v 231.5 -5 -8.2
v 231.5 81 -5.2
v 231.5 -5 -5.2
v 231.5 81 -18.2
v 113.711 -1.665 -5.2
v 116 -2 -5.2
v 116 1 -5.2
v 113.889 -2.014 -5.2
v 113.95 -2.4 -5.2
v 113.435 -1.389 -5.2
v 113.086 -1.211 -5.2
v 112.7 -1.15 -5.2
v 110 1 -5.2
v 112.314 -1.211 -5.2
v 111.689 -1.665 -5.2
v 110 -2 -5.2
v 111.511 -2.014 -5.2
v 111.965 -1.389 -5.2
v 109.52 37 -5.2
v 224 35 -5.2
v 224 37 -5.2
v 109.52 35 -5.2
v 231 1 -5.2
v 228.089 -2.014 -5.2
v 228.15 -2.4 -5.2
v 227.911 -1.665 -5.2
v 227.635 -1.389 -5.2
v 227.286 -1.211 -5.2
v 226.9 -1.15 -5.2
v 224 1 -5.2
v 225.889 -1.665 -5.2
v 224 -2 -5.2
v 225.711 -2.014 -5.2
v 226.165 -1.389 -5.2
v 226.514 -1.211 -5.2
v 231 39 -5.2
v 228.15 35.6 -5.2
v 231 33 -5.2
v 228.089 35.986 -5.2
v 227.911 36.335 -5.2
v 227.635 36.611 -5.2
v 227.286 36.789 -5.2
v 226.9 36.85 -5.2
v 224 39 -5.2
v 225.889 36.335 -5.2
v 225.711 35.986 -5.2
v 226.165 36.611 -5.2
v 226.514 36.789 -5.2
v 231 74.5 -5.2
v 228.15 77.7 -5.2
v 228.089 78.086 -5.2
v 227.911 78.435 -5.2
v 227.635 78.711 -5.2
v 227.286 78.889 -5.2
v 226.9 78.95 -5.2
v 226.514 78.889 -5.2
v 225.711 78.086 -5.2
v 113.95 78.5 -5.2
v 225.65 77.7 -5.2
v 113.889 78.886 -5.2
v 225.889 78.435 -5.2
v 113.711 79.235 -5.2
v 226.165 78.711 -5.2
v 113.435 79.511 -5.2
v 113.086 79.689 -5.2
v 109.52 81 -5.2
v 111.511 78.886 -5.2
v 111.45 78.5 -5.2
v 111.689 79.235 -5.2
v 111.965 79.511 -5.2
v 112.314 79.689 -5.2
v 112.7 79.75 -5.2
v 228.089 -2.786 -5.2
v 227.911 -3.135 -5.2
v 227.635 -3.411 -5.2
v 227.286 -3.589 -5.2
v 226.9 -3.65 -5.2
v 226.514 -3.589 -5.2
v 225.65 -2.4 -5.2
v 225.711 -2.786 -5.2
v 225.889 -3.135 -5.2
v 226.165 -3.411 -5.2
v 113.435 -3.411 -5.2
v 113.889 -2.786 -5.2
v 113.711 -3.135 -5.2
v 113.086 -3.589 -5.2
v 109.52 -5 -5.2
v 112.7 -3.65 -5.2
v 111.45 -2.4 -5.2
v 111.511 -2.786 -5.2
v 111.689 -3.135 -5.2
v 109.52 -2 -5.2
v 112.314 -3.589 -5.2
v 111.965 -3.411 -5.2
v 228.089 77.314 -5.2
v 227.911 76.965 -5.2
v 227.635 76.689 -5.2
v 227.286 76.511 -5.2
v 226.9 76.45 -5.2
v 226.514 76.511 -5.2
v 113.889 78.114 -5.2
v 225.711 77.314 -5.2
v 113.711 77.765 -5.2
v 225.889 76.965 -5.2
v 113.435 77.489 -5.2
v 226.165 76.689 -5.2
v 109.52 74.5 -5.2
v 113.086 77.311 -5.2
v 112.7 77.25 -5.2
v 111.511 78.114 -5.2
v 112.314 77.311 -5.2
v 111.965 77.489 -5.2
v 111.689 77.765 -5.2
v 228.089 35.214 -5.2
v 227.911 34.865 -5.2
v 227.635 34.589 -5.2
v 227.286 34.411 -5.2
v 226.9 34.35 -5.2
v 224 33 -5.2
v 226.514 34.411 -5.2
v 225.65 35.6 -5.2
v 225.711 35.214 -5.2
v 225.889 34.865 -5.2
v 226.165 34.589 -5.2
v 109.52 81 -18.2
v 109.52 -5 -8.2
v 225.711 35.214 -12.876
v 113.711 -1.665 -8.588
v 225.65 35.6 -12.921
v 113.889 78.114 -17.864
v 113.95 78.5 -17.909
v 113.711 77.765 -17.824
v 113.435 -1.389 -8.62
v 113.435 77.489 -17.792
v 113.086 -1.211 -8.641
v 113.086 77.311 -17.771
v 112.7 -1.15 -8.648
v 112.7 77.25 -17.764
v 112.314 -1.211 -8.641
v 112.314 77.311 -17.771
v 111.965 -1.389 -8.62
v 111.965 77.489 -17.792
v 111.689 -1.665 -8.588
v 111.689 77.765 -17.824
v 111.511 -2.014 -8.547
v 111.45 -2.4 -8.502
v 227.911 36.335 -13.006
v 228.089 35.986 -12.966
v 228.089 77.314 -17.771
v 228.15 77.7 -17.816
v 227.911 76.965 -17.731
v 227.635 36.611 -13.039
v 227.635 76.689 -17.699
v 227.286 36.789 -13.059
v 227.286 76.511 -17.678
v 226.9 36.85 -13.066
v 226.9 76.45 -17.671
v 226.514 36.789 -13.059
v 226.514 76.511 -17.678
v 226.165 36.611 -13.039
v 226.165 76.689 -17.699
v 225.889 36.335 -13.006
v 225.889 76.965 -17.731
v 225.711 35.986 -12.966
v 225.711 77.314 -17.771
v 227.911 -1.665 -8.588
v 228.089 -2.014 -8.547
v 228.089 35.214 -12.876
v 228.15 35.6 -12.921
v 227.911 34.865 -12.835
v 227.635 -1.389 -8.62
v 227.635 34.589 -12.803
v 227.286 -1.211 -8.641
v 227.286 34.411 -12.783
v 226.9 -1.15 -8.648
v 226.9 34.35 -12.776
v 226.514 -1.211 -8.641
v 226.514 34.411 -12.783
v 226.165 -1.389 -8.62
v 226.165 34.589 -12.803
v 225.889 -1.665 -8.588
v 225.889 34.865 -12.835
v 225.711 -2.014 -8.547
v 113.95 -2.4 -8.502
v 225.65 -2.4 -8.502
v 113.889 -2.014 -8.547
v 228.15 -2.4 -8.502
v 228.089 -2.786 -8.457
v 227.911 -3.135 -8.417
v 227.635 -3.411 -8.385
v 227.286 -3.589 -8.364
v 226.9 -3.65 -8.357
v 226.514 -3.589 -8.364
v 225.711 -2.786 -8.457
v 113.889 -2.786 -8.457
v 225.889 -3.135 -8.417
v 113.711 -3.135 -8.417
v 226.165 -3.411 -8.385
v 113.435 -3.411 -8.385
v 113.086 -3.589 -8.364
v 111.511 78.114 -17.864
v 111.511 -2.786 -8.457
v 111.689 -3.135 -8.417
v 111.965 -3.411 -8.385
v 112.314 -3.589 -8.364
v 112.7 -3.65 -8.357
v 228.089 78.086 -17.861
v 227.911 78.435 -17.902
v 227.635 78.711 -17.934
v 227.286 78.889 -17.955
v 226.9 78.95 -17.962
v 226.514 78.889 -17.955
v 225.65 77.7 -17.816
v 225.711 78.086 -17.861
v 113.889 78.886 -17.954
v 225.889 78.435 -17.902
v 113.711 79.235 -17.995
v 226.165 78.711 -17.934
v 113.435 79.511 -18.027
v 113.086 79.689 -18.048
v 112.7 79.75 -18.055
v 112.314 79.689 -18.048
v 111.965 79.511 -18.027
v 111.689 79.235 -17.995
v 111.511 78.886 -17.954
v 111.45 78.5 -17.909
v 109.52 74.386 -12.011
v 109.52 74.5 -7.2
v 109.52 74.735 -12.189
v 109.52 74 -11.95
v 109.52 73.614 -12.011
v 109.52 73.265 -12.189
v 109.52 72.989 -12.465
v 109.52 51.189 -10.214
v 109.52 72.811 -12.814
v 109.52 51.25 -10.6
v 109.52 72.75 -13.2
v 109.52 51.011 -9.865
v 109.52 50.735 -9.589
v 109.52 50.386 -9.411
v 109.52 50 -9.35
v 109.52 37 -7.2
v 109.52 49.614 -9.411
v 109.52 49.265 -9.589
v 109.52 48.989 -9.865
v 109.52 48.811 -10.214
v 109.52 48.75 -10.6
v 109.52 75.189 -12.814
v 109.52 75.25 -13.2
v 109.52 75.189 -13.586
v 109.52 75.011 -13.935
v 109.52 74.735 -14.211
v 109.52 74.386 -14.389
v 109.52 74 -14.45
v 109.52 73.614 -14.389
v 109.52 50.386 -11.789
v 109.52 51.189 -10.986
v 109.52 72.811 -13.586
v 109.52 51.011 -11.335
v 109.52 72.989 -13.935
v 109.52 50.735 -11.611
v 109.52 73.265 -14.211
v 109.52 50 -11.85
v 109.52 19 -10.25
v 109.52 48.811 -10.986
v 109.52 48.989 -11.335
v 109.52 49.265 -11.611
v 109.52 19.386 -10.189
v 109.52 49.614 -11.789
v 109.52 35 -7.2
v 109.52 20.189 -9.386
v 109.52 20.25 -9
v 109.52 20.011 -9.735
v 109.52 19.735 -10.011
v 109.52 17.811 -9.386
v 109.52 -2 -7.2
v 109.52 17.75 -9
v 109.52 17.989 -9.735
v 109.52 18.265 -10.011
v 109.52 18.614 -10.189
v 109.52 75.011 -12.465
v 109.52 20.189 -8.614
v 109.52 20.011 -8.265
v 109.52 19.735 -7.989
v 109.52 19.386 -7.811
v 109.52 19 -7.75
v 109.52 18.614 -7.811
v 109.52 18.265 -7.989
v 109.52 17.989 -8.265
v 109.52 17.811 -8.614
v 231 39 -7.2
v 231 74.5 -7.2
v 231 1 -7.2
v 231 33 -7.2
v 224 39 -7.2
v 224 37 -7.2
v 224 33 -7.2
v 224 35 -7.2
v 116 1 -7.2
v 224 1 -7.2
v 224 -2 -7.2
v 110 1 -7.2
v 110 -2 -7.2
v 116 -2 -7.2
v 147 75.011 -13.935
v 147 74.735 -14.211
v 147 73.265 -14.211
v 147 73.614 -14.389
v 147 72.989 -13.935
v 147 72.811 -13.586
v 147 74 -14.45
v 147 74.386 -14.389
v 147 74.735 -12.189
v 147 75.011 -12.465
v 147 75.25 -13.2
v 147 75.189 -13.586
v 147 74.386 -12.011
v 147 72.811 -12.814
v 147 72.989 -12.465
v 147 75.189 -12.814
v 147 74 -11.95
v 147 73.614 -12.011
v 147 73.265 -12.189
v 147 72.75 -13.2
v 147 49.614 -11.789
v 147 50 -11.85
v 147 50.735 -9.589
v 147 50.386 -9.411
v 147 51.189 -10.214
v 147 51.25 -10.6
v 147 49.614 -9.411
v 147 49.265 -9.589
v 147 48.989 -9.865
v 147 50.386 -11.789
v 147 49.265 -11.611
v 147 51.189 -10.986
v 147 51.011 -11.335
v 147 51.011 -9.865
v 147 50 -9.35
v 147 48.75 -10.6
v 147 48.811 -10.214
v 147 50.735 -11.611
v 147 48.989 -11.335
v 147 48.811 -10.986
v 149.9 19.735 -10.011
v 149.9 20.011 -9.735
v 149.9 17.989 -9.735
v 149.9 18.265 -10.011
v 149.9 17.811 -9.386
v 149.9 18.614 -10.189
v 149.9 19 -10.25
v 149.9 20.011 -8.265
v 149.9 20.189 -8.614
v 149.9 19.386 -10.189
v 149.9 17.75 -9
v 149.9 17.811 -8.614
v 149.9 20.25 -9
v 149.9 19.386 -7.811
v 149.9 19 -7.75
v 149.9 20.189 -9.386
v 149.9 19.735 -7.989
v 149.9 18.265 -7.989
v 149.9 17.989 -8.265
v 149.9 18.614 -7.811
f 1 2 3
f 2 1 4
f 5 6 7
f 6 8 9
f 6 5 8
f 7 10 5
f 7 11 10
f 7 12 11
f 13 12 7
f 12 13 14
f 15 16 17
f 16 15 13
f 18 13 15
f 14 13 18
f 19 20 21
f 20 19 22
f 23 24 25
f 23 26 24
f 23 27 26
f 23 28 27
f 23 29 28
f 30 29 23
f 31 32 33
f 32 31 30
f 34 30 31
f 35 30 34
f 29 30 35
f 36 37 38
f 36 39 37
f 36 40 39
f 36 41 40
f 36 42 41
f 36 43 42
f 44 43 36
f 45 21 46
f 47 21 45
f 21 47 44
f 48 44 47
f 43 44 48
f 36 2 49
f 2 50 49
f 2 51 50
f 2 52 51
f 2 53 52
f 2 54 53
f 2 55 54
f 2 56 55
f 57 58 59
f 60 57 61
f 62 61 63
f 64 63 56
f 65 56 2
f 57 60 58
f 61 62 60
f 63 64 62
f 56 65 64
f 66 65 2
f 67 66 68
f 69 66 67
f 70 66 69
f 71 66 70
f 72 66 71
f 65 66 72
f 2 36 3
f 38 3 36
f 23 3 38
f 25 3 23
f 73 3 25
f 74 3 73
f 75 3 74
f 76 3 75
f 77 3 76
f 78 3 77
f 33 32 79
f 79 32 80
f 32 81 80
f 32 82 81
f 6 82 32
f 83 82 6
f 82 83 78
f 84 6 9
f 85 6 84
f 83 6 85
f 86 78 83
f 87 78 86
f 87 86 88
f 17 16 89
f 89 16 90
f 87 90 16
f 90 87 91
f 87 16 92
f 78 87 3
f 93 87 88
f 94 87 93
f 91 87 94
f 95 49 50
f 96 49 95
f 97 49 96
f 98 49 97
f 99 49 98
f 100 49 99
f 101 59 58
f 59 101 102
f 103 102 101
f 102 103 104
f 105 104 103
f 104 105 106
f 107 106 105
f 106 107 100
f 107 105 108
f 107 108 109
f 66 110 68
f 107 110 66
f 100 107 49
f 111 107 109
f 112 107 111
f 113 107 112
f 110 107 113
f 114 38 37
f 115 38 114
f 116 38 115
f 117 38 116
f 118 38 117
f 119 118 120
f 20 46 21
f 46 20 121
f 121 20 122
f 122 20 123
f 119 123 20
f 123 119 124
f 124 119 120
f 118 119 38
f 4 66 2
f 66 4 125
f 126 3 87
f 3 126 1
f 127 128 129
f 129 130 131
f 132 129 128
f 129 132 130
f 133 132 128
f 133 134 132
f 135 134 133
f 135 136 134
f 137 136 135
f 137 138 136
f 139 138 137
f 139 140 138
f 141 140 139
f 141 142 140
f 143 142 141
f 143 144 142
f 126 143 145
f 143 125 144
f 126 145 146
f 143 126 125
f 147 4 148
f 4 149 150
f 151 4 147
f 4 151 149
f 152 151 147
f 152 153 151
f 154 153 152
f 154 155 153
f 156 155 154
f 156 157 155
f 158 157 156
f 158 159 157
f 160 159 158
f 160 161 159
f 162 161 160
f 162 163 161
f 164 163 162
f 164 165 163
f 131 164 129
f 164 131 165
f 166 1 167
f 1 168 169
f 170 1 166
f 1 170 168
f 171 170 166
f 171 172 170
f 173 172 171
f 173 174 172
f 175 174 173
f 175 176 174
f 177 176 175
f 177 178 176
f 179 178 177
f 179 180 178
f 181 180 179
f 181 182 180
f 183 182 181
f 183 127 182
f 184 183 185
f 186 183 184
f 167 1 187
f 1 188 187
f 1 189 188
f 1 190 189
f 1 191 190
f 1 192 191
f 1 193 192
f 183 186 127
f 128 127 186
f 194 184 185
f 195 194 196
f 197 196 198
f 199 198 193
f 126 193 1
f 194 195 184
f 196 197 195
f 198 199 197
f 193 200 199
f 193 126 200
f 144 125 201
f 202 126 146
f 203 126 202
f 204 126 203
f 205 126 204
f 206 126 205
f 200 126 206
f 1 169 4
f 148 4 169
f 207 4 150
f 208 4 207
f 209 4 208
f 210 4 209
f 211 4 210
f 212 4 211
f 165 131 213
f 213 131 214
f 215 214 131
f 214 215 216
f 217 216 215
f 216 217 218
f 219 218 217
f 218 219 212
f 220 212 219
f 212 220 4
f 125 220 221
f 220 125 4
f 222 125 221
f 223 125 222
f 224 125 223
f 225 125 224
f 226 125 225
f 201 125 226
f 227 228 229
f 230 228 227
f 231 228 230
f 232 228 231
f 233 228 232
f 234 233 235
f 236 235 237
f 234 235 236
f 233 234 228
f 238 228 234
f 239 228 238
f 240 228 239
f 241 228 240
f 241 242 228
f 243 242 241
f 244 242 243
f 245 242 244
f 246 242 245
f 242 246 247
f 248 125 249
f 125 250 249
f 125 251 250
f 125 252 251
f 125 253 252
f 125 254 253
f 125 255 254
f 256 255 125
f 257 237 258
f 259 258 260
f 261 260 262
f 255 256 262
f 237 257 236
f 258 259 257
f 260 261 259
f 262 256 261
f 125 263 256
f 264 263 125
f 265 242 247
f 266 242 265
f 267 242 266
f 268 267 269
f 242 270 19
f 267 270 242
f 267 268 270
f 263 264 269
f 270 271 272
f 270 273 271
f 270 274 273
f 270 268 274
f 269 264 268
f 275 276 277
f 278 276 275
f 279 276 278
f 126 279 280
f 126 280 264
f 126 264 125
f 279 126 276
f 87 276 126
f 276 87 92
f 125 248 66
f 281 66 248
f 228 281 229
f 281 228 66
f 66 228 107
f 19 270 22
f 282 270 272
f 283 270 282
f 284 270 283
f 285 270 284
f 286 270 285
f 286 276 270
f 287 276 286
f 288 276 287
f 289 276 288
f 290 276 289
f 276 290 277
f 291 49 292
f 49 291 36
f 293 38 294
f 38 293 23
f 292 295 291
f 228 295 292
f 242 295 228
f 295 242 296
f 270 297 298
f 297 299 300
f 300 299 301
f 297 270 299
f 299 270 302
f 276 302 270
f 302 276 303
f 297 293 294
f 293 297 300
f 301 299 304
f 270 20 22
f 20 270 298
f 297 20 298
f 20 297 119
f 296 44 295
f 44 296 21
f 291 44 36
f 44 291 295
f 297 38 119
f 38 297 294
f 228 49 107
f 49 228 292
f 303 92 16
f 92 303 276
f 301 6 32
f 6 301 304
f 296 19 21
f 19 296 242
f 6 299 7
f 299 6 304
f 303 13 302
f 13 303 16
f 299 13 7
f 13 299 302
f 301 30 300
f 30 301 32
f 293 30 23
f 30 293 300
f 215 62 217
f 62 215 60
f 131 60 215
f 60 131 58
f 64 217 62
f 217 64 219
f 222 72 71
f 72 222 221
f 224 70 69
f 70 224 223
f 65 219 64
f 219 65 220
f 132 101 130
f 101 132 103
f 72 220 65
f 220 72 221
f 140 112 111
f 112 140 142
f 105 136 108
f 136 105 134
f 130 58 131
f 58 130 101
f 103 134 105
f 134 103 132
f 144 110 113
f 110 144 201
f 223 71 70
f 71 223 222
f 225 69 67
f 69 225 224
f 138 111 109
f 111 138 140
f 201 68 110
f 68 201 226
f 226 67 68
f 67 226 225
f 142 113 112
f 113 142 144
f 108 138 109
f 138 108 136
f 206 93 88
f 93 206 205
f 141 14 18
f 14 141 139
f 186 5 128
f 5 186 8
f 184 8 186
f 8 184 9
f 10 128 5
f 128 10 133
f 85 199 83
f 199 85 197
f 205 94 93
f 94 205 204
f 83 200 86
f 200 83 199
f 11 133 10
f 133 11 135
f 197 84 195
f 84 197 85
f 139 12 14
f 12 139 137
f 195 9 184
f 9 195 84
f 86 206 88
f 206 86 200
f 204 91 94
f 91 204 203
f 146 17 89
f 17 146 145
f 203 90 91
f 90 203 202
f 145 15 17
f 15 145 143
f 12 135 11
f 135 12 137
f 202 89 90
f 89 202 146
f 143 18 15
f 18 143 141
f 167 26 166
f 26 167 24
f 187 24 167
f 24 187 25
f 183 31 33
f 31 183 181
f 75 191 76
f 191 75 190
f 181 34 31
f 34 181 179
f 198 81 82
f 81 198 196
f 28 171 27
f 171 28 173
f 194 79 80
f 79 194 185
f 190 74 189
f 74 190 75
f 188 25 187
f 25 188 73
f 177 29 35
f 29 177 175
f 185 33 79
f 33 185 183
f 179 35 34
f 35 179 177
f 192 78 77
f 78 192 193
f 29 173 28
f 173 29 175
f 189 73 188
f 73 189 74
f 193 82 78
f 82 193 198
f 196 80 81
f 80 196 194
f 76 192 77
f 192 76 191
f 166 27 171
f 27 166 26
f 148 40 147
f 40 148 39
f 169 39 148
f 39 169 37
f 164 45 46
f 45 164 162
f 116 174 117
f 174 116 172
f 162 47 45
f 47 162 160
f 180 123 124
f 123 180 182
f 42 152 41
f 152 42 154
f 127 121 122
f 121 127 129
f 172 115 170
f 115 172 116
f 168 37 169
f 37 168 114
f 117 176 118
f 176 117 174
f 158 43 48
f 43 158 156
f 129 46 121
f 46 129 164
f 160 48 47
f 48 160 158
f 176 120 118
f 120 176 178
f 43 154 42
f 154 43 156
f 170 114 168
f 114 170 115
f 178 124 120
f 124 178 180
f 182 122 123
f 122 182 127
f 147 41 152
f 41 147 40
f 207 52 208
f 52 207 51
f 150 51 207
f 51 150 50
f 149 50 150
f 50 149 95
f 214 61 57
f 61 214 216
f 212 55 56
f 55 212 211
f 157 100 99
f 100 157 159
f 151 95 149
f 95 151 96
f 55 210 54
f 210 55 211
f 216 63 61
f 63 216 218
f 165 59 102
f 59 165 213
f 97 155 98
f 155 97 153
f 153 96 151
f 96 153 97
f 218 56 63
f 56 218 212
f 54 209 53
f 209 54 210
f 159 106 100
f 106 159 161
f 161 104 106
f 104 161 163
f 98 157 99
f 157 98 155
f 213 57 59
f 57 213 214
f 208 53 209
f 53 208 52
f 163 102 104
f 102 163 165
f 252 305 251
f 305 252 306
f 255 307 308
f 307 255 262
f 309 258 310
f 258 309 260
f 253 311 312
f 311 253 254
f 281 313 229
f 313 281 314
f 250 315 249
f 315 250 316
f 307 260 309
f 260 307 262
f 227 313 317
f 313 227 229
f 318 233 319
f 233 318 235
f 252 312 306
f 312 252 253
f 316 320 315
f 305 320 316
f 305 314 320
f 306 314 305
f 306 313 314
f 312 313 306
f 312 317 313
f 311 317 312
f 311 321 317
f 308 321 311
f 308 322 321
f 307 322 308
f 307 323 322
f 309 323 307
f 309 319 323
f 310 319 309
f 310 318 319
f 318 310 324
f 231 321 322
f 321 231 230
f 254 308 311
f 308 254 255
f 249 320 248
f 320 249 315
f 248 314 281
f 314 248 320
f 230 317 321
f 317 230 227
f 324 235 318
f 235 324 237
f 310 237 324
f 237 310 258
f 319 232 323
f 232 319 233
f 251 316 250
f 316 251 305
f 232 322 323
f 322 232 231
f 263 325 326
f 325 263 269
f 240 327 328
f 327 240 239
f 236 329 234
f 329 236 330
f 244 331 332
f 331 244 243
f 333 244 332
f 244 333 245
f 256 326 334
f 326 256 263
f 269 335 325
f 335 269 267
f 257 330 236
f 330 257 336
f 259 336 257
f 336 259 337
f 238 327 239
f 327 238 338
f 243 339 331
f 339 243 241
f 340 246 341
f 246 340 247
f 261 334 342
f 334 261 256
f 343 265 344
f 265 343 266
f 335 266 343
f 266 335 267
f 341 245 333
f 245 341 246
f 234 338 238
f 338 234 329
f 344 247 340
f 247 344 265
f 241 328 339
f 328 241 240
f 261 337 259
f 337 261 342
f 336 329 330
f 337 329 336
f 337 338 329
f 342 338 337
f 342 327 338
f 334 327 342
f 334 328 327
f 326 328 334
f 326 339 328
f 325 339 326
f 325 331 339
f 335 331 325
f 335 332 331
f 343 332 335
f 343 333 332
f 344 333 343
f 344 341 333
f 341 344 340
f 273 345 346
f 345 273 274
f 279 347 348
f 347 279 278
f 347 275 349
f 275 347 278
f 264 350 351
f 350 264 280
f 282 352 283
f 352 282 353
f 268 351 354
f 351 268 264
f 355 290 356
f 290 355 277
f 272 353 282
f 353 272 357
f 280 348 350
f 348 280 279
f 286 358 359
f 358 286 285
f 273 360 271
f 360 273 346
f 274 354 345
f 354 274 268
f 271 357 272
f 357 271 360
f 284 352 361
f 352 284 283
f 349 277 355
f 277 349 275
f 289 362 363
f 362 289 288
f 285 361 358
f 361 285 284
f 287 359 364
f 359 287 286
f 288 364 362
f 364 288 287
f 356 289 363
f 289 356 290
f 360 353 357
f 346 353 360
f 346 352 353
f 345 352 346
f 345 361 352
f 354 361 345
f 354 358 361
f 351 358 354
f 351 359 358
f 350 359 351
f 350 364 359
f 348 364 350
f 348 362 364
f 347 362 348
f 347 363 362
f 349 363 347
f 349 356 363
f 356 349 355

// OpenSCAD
$fn=20;

$CASE_THICKNESS = 3; // minus 3d printer tolerence



if (false)
    translate([0,0,-4])
    color("gray",1)
    rotate([180,180,180])
    translate([-45.9,129 ,-4.7])
    import ("amc48k_PCBv2.stl");


translate([0,0,-8.2]) 
difference()
{
 intersection()
 {  
     
     //$CHOP_POINT=119+(19.02*0)+0.4;  // Half and half chop point
     $CHOP_POINT=24+(19.02*6)+0.4-5;  // Half and half chop point
     //$CHOP_POINT=24+(19.02*1)+0.4;  // Half and half chop point
     
     // Small print section
//     rotate([0,0,3]) // rotate to create a diagonal split of the 2 halfs.
     {  
         if (false){
            translate([-100,-100,-10])
    //        cube([119,192,20]); //1x4
    //        cube([140,142,20]); //3x3
              cube([900,900,20]);  // Everything
         }
        else{
            //////////////////////////////
            // Half and half
            //////////////////////////////
            
            if(false){//6x4_left
                translate([-24,-30,-30])
                cube([$CHOP_POINT,192,40]); 
            }else{ //6x4_right
                translate([-24,-30,-30])
                translate([$CHOP_POINT,0,0])
                cube([$CHOP_POINT,192,40]); 
            }
         
        }
    }
    union(){
        
        //Main body
        translate([-22,-5,0])
        color("orange")    
        //cube([232,86-0.3,$PLATE_THICKNESS]);
        cube([235+18.5,86,$CASE_THICKNESS]);
    
   
        //Sloping base
        color("green")
        translate([-22,-5,0]) 
        rotate([0,90,0])
        linear_extrude(height = 235+18.5, center = false, convexity = 10, twist = 0, slices = 20, $fn = 16)
        polygon(points=[[0,0],[10,86],[0,86]]);
    }
         
    //         else
    //             translate([-5+2.5-18.5,-5,0])
    //             color("re2")    
    //             cube([235+18.5,86,$PLATE_THICKNESS]);
    //         
    //         
    //         
    //         linear_extrude(height=5, center=true, convexity= 10){
    //             import("kbplate.svg");
    //         }
    //     }
    // }    
 }
 // Remove bolt holes
 // Bolt Hole bottom left
 translate([-19.1,-2.4,-10])
 cylinder(h=20,d=2.5);

 // Bolt Hole Middle left
 translate([-19.1,-2.4,-10])
 translate([0.5,40.8,0])
 cylinder(h=20,d=2.5);

 // Bolt Hole Top left
 translate([-19.1,-2.4,-10])
 translate([20,80.8,0])
 cylinder(h=20,d=2.5);

 // Bolt Hole Top middle
 translate([-19.1,-2.4,-10])
 translate([131.8,80.9,0])
 cylinder(h=20,d=2.5);
 
 // Bolt Hole Bottom middle
 translate([-19.1,-2.4,-10])
 translate([131.8,0.0,0])
 cylinder(h=20,d=2.5);

 // Bolt Hole Bottom right
 translate([-19.1,-2.4,-10])
 translate([246.0,0.0,0])
 cylinder(h=20,d=2.5);
 
 // Bolt Hole middle right
 translate([-19.1,-2.4,-10])
 translate([246.0,38.0,0])
 cylinder(h=20,d=2.5);

 // Bolt Hole Top right
 translate([-19.1,-2.4,-10])
 translate([246.0,80.1,0])
 #cylinder(h=20,d=2.5);
 
 // Horizonal join top
 translate([107.0-40,76.0-2,-5])
 rotate([0,90,0])
 #cylinder(h=80,d=2.5);

 // Horizonal join middle
 translate([107.0-40,50.0,-2.4])
 rotate([0,90,0])
 #cylinder(h=80,d=2.5);
 
  // Horizonal join bottom
 translate([109.9-40,19,-0.8])
 rotate([0,90,0])
 #cylinder(h=80,d=2.5);
 
 difference(){
    translate([-21.0,-4,1])
    cube([252.5-0.5,84,$CASE_THICKNESS-0.5]);
    
    // Bottom left 
    translate([-21.0,-4,1])
    cube([19,22,$CASE_THICKNESS-0.5]);
    
    // Left middle 
    translate([-21.0,35,1])
    cube([6,8,$CASE_THICKNESS-0.5]);

    // Left middle 
    translate([224.0,33,1])
    cube([7,6,$CASE_THICKNESS-0.5]);
        
    // Top edge
    translate([-2,74.5,1])
    cube([233,5.5,$CASE_THICKNESS-0.5]);
      
    // Bottom edge
    translate([-2,-5,1])
    cube([233,3,$CASE_THICKNESS-0.5]);

    // Middle support
    translate([-21,35,1])
    cube([245,2,$CASE_THICKNESS-0.5]);
    
    // middle bottom
    translate([110.0,-5,1])
    cube([6,6,$CASE_THICKNESS-0.5]);
        
    // middle right
    translate([224.0,-5,1])
    cube([7,6,$CASE_THICKNESS-0.5]);
  
 }

}



 
 
//#linear_extrude(height=5, center=true, convexity= 10){
//         import("kbplate_bot.svg");
//}
 
 
 if(false)
 translate([8,7,12])
{

	//1. steam
	color("brown"){
		//1.1. l-r tab is 1.35mm
		translate([0,0,-3.62/2])
			cube([1.35,4.5,3.62], center=true);
		//1.2. f-b tab is 1.15mm. it has a smal notch that i will ignore.
		translate([0,0,-3.62/2])
			cube([4.5,1.15,3.62], center=true);
		//1.3. base. it has a chamfered top that i will ignore.
		translate([0,0,-5.62])
			cube([7.2,5.56,4], center=true);
	}
	// 2. top
	color("grey"){
		difference(){
			// make a trapezoid with the general shape (volume?) of the top
			hull(){
				translate([0,0,-4]) //distance from top of switch... some i measured 3.9 others 4.2... so leaving at 4
					cube([9.87,10.62,0.1], center=true);
				translate([0,0,-4 -5.2]) // bottom has a measured 5.3... so move 5.2 and use the 0.1 bellow
					cube([14.58,14.58,0.1], center=true);
			}

		// and subtract:
		// the front led. NOTE: totally off... measured by eye. just for astetics
		// adding just so there is a visual cue of the direction
			translate([0,-4.7,-6])
				cylinder(r=3/2, h=6, center=true);
			translate([0,-5.5,-6])
				cube([8,4,5], center=true);
		// the four corners
			// TODO waste of time? this is all for looks, you shouldn't invade any of that space anyway...
		}
	}

	// 3. bottom
	color("green")
		// 3.1 main body volume
		hull(){
				translate([0,0,-4 -5.3]) //steam + top
					cube([13.98,13.98,0.1], center=true);
				translate([0,0,-4 -5.3 -2.2]) //steam + top + straigth part
					cube([13.98,13.98,0.1], center=true);
				translate([0,0,-4 -5.3 -5.5]) //steam + top + bottom (measured 5.5)
					cube([12.74,13.6,0.1], center=true);
		}
		// 3.2 tabs
		// note: only measured the lenght, if they are slightly off-center, this will be all wrong :)
		color("black")
		difference(){
			translate([0,0,-4 -5.3 -0.82/2]) //steam + top
				cube([15.64,15.64,0.82], center=true);
			translate([0,0,-4 -5.3 -0.82/2  ]) // front-back cut
				cube([5.64,20,0.82 +2], center=true);
			translate([0,0,-4 -5.3 -0.82/2  ]) //side cut
				cube([20,11.64,0.82 +2], center=true);
		}

		// 3.3 tab (plate snap on). to use this mechanically, you have to take into account the bending (as it will move the bottom part slightly up...) just for gross reference here for now
		color("white"){
			// 3.3.1 top
			translate([0,0,-4 -5.3 -0.82/2  ]) // front-back cut
				cube([1.82,16.33,0.82], center=true);
			// 3.3.2 bottom
			difference(){
				hull(){
					translate([0,0,-4 -5.3 -0.82/2 -1.76  ]) // front-back cut
						cube([3.65,14,0.1], center=true);
					translate([0,0,-4 -5.3 -0.82/2 -2.2  ]) // front-back cut
						cube([3.65,14.74,0.1], center=true);
					translate([0,0,-4 -5.3 -0.82/2 -2.89  ]) // front-back cut
						cube([3.65,14,0.1], center=true);
				}
				translate([0,0,-4 -5.3 -0.82/2 -1.76   ]) // front-back cut
					cube([2.2,20,4], center=true);

			}
		}

		// 4. bottom guides
		// again, i'm assuming everything is centered...
		color("darkGreen"){
			// 4.1 cylinder
			translate([0,0,-4 -5.3 -5.5 -2/2]) //steam + top + bottom (measured 5.5)
				cylinder(r=3.85/2, h=2, center=true);
			translate([0,0,-4 -5.3 -5.5 -2 -1/2]) //steam + top + bottom (measured 5.5)
				cylinder(r2=3.85/2, r=2.8/2, h=1, center=true);
			// 4.2 PCB pins
			translate([4.95,0,-4 -5.3 -5.5 -2/2]) //steam + top + bottom (measured 5.5)
				cylinder(r=1.6/2, h=2, center=true);
			translate([4.95,0,-4 -5.3 -5.5 -2 -1/2]) //steam + top + bottom (measured 5.5)
				cylinder(r2=1.6/2, r=1/2, h=1, center=true);
			translate([-4.95,0,-4 -5.3 -5.5 -2/2]) //steam + top + bottom (measured 5.5)
				cylinder(r=1.6/2, h=2, center=true);
			translate([-4.95,0,-4 -5.3 -5.5 -2 -1/2]) //steam + top + bottom (measured 5.5)
				cylinder(r2=1.6/2, r=1/2, h=1, center=true);
		}

		// 5. pins
		color("orange"){
			translate([-3.77,2.7,-4 -5.3 -5.5 -3.1/2]) //steam + top + bottom (measured 5.5)
				cube([.86, 0.2,3.1], center=true);
			translate([2.7,5.2,-4 -5.3 -5.5 -3.1/2]) //steam + top + bottom (measured 5.5)
				cube([.86, 0.2,3.1], center=true);
		}

}

 
 /*
 }
 */
 
